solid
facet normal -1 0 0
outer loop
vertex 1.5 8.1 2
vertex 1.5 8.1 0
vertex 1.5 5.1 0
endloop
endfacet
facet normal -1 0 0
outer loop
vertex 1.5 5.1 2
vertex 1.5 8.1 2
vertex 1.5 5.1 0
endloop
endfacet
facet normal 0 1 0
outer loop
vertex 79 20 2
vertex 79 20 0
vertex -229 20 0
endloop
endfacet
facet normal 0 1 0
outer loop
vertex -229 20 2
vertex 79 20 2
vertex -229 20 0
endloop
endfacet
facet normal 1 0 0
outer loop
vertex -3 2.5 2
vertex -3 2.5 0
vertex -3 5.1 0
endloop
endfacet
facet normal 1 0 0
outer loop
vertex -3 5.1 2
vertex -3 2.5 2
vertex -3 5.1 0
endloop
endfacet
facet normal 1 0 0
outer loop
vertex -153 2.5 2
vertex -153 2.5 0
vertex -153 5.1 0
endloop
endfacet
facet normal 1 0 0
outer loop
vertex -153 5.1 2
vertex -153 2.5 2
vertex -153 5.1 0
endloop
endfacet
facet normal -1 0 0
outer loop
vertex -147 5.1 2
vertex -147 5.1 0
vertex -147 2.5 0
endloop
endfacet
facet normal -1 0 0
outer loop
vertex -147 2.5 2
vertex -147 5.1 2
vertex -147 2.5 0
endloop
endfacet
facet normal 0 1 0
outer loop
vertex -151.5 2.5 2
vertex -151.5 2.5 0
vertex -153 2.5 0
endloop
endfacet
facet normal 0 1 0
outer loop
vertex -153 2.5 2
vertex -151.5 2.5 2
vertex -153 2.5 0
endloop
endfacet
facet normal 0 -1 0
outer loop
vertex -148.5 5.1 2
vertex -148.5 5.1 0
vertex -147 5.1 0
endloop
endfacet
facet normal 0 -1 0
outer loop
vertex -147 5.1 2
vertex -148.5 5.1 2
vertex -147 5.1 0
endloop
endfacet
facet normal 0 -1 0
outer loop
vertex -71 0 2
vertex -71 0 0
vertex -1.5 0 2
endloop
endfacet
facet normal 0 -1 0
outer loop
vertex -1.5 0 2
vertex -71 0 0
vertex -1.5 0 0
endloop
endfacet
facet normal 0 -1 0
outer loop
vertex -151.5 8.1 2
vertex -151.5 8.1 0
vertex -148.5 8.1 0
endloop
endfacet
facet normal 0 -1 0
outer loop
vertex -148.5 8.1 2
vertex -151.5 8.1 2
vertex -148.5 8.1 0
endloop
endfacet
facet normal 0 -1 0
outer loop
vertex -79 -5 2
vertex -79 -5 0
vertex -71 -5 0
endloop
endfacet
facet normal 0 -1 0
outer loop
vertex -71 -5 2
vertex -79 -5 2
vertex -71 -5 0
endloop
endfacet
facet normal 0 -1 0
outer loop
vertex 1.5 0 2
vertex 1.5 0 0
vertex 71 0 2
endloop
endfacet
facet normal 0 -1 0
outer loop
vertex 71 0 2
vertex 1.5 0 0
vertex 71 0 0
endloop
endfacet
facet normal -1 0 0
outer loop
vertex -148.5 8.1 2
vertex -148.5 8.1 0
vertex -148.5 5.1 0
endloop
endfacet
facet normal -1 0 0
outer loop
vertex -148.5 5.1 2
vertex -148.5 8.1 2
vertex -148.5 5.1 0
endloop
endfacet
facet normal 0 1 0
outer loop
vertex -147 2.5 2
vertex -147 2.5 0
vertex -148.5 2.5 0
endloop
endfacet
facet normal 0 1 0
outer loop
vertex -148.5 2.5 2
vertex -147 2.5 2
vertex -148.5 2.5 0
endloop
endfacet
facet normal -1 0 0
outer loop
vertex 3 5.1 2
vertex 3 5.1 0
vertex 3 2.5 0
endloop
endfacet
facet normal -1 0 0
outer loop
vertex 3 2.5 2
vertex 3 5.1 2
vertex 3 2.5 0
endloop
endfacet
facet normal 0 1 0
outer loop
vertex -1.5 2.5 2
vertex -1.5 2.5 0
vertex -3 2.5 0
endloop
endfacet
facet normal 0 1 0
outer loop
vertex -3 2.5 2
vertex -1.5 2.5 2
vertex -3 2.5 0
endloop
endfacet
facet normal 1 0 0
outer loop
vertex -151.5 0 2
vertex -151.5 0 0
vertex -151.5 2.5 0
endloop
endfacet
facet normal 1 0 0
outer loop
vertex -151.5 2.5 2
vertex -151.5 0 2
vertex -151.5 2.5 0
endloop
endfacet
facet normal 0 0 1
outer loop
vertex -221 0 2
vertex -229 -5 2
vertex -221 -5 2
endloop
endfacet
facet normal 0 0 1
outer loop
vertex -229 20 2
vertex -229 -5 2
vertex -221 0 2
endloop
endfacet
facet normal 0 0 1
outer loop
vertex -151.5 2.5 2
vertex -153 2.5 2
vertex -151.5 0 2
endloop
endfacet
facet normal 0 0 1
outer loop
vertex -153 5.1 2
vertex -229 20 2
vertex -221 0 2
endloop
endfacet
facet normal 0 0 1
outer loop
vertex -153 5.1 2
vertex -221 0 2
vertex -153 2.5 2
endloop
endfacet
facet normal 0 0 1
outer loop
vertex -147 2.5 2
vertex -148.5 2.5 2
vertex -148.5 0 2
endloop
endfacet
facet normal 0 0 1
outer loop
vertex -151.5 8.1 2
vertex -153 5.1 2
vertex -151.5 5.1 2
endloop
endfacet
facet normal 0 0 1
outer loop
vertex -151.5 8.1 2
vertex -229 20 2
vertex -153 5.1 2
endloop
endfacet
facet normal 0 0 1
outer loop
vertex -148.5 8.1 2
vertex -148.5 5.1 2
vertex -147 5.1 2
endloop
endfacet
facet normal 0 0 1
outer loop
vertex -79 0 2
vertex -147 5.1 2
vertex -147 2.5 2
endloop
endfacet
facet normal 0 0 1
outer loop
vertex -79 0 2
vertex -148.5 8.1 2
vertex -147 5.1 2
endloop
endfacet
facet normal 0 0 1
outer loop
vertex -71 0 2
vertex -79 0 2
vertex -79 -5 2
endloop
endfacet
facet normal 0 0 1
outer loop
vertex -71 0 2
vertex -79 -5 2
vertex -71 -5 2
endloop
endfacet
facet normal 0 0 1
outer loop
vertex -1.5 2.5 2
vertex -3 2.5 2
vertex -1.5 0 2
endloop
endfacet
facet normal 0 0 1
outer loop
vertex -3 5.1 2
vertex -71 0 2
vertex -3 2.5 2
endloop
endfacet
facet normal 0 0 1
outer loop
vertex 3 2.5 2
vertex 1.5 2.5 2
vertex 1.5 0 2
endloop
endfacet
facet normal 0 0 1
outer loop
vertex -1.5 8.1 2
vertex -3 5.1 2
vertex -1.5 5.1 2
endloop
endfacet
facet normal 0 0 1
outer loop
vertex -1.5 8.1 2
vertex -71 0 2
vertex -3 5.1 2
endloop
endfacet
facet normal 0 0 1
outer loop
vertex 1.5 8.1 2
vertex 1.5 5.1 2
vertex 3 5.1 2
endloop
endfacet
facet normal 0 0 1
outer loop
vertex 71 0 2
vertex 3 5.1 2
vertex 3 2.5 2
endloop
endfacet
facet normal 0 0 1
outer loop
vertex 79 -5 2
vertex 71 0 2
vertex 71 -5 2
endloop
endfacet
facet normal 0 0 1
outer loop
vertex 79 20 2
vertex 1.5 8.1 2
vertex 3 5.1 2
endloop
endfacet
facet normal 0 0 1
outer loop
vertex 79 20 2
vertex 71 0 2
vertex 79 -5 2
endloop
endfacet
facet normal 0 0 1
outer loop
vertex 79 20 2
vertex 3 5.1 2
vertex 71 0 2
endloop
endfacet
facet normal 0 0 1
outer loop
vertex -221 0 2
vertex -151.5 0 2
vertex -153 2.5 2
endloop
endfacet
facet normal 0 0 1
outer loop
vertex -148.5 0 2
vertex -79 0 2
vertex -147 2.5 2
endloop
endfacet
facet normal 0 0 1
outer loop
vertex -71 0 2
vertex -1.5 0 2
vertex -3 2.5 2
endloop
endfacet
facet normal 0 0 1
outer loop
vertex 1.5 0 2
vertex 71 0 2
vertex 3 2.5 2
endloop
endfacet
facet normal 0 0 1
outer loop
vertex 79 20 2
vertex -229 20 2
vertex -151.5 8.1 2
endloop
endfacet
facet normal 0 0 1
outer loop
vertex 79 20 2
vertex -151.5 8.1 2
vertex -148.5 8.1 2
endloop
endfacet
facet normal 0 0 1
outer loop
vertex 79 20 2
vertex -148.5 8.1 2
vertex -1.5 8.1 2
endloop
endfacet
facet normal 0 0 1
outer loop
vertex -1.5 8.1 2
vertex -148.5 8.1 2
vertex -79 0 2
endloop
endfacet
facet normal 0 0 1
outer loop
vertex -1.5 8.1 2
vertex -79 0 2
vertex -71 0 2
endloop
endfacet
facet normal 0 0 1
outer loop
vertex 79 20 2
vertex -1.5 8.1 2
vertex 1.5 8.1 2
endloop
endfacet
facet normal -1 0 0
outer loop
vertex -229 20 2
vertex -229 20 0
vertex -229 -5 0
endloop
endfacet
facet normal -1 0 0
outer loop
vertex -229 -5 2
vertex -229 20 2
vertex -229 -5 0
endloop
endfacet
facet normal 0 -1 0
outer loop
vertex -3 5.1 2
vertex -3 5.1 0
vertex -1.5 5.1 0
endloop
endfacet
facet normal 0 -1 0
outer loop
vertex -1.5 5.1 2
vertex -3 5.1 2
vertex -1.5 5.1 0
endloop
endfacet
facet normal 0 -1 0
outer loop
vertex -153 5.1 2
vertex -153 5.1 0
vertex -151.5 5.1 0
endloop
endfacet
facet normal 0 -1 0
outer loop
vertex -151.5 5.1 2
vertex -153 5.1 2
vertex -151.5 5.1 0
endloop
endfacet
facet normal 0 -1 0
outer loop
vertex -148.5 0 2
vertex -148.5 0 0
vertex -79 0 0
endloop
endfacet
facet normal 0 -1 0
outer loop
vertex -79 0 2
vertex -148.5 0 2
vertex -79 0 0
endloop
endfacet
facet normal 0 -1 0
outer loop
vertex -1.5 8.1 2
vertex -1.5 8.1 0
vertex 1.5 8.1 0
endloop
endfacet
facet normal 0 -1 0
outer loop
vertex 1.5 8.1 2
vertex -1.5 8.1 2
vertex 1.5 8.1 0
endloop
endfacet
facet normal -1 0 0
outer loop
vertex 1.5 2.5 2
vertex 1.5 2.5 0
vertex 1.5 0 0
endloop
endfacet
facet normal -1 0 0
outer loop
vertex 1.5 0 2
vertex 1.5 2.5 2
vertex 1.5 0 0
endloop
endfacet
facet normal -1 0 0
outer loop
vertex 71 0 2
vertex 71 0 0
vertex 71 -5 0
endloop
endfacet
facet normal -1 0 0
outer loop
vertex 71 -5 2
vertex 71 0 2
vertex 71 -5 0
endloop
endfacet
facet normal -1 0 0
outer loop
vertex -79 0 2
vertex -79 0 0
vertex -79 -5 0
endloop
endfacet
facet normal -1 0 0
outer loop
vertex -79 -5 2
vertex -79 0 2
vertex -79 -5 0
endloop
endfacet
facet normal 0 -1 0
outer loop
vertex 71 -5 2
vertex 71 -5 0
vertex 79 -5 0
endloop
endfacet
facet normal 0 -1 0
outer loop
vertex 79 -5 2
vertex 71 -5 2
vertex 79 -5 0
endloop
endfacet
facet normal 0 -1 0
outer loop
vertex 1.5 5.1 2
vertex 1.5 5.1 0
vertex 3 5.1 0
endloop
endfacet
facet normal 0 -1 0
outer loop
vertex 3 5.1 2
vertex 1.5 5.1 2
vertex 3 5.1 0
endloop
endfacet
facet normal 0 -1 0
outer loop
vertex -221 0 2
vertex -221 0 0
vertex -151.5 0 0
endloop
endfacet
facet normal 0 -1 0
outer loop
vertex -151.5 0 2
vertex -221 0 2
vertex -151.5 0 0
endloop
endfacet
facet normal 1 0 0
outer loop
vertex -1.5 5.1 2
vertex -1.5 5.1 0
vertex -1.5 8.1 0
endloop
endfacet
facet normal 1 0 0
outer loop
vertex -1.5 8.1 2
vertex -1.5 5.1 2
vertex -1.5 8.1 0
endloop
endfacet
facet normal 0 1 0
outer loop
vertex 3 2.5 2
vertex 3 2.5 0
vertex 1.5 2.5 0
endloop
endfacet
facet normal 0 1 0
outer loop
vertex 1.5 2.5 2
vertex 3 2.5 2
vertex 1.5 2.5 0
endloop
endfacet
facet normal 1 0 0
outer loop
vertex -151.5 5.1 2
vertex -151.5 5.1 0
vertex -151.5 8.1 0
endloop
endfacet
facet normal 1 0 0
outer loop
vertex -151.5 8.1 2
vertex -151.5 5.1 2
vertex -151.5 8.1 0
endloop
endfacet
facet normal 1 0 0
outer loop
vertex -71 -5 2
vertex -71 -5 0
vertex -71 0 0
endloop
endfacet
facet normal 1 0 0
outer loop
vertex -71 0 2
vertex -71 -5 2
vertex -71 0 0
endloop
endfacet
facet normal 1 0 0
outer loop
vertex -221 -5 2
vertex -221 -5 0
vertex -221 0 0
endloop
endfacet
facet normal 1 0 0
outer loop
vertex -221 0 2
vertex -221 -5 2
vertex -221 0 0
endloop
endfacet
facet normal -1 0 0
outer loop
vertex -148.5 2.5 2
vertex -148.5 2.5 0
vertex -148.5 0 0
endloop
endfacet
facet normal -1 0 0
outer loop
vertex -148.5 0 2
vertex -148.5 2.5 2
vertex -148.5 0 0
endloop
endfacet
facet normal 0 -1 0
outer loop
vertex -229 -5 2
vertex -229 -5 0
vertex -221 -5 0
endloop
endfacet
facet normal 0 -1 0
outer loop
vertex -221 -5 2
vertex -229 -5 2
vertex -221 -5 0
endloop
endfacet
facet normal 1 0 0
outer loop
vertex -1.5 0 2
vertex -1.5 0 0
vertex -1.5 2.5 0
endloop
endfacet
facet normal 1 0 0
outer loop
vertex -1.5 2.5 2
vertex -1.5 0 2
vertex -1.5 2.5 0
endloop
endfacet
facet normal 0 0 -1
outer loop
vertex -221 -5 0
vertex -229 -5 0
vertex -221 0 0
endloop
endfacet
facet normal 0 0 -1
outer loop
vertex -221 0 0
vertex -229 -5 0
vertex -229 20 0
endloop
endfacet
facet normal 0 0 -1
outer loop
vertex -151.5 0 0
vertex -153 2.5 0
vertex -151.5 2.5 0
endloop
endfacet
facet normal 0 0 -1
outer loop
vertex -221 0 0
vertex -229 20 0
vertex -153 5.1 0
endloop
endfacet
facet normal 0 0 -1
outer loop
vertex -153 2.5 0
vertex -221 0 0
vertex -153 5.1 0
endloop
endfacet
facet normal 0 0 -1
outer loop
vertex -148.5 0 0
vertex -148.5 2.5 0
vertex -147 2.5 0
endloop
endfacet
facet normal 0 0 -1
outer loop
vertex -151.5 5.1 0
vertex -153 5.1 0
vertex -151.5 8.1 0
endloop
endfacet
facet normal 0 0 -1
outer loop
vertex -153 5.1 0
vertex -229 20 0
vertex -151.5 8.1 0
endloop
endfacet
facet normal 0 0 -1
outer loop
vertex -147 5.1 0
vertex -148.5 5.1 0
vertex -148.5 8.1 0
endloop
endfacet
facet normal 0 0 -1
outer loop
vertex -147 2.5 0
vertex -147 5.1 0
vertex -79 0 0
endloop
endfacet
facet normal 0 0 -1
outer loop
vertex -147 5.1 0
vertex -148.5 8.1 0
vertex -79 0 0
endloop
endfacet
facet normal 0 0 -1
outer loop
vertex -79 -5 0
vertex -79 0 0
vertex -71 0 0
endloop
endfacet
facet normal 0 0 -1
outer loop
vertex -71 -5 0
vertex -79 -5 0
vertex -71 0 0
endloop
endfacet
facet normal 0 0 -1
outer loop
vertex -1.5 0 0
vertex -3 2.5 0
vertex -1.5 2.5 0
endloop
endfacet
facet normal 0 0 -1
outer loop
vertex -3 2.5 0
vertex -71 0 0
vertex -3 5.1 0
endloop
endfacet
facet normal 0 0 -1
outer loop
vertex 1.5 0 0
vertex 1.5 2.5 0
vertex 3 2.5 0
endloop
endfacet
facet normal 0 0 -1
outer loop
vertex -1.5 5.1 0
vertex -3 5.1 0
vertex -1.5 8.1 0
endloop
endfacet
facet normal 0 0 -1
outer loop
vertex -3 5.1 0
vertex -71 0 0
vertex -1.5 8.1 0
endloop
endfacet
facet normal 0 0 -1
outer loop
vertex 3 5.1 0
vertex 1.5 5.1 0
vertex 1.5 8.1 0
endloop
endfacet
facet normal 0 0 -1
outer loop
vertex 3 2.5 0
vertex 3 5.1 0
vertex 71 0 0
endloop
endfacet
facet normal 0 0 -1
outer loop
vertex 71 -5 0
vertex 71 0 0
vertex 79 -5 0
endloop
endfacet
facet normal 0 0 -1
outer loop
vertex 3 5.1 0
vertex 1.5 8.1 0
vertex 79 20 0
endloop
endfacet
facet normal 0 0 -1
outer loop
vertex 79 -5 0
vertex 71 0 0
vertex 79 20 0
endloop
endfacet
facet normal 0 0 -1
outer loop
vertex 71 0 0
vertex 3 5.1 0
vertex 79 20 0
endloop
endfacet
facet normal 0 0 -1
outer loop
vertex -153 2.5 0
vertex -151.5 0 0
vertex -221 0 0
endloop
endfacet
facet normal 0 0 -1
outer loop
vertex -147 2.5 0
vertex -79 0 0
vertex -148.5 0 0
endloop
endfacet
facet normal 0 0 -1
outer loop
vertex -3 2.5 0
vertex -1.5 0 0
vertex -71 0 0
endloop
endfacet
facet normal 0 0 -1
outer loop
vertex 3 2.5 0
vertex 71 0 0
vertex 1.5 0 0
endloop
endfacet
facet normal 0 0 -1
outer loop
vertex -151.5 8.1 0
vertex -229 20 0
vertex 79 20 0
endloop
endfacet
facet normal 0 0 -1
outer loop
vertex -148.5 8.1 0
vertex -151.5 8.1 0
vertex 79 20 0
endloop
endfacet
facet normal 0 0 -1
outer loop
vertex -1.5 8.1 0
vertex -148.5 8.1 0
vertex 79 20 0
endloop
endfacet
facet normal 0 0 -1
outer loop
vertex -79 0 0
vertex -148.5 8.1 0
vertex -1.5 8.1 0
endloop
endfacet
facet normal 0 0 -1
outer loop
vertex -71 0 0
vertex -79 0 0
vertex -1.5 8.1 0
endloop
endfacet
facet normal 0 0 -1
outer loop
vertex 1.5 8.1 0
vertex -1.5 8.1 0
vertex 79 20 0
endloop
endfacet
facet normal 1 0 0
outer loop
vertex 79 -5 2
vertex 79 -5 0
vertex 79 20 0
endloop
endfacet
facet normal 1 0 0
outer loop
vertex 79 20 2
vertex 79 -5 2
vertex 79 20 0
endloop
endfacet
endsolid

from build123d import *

# Parameters (mm, degrees)
EXTRUDE_1_DEPTH = 2


with BuildPart() as part:
    # 草图1 → 凸台-拉伸1 (new body)
    with BuildSketch(Plane.XY):
        Polygon((-229, 0), (-229, -5), (-221, -5), (-221, 0), (-151.5, 0), (-151.5, 2.5), (-153, 2.5), (-153, 5.1), (-151.5, 5.1), (-151.5, 8.1), (-148.5, 8.1), (-148.5, 5.1), (-147, 5.1), (-147, 2.5), (-148.5, 2.5), (-148.5, 0), (-79, 0), (-79, -5), (-71, -5), (-71, 0), (-1.5, 0), (-1.5, 2.5), (-3, 2.5), (-3, 5.1), (-1.5, 5.1), (-1.5, 8.1), (1.5, 8.1), (1.5, 5.1), (3, 5.1), (3, 2.5), (1.5, 2.5), (1.5, 0), (71, 0), (71, -5), (79, -5), (79, 0), (79, 20), (71, 20), (-229, 20), align=None)
    extrude(amount=EXTRUDE_1_DEPTH)


solid = part.part
